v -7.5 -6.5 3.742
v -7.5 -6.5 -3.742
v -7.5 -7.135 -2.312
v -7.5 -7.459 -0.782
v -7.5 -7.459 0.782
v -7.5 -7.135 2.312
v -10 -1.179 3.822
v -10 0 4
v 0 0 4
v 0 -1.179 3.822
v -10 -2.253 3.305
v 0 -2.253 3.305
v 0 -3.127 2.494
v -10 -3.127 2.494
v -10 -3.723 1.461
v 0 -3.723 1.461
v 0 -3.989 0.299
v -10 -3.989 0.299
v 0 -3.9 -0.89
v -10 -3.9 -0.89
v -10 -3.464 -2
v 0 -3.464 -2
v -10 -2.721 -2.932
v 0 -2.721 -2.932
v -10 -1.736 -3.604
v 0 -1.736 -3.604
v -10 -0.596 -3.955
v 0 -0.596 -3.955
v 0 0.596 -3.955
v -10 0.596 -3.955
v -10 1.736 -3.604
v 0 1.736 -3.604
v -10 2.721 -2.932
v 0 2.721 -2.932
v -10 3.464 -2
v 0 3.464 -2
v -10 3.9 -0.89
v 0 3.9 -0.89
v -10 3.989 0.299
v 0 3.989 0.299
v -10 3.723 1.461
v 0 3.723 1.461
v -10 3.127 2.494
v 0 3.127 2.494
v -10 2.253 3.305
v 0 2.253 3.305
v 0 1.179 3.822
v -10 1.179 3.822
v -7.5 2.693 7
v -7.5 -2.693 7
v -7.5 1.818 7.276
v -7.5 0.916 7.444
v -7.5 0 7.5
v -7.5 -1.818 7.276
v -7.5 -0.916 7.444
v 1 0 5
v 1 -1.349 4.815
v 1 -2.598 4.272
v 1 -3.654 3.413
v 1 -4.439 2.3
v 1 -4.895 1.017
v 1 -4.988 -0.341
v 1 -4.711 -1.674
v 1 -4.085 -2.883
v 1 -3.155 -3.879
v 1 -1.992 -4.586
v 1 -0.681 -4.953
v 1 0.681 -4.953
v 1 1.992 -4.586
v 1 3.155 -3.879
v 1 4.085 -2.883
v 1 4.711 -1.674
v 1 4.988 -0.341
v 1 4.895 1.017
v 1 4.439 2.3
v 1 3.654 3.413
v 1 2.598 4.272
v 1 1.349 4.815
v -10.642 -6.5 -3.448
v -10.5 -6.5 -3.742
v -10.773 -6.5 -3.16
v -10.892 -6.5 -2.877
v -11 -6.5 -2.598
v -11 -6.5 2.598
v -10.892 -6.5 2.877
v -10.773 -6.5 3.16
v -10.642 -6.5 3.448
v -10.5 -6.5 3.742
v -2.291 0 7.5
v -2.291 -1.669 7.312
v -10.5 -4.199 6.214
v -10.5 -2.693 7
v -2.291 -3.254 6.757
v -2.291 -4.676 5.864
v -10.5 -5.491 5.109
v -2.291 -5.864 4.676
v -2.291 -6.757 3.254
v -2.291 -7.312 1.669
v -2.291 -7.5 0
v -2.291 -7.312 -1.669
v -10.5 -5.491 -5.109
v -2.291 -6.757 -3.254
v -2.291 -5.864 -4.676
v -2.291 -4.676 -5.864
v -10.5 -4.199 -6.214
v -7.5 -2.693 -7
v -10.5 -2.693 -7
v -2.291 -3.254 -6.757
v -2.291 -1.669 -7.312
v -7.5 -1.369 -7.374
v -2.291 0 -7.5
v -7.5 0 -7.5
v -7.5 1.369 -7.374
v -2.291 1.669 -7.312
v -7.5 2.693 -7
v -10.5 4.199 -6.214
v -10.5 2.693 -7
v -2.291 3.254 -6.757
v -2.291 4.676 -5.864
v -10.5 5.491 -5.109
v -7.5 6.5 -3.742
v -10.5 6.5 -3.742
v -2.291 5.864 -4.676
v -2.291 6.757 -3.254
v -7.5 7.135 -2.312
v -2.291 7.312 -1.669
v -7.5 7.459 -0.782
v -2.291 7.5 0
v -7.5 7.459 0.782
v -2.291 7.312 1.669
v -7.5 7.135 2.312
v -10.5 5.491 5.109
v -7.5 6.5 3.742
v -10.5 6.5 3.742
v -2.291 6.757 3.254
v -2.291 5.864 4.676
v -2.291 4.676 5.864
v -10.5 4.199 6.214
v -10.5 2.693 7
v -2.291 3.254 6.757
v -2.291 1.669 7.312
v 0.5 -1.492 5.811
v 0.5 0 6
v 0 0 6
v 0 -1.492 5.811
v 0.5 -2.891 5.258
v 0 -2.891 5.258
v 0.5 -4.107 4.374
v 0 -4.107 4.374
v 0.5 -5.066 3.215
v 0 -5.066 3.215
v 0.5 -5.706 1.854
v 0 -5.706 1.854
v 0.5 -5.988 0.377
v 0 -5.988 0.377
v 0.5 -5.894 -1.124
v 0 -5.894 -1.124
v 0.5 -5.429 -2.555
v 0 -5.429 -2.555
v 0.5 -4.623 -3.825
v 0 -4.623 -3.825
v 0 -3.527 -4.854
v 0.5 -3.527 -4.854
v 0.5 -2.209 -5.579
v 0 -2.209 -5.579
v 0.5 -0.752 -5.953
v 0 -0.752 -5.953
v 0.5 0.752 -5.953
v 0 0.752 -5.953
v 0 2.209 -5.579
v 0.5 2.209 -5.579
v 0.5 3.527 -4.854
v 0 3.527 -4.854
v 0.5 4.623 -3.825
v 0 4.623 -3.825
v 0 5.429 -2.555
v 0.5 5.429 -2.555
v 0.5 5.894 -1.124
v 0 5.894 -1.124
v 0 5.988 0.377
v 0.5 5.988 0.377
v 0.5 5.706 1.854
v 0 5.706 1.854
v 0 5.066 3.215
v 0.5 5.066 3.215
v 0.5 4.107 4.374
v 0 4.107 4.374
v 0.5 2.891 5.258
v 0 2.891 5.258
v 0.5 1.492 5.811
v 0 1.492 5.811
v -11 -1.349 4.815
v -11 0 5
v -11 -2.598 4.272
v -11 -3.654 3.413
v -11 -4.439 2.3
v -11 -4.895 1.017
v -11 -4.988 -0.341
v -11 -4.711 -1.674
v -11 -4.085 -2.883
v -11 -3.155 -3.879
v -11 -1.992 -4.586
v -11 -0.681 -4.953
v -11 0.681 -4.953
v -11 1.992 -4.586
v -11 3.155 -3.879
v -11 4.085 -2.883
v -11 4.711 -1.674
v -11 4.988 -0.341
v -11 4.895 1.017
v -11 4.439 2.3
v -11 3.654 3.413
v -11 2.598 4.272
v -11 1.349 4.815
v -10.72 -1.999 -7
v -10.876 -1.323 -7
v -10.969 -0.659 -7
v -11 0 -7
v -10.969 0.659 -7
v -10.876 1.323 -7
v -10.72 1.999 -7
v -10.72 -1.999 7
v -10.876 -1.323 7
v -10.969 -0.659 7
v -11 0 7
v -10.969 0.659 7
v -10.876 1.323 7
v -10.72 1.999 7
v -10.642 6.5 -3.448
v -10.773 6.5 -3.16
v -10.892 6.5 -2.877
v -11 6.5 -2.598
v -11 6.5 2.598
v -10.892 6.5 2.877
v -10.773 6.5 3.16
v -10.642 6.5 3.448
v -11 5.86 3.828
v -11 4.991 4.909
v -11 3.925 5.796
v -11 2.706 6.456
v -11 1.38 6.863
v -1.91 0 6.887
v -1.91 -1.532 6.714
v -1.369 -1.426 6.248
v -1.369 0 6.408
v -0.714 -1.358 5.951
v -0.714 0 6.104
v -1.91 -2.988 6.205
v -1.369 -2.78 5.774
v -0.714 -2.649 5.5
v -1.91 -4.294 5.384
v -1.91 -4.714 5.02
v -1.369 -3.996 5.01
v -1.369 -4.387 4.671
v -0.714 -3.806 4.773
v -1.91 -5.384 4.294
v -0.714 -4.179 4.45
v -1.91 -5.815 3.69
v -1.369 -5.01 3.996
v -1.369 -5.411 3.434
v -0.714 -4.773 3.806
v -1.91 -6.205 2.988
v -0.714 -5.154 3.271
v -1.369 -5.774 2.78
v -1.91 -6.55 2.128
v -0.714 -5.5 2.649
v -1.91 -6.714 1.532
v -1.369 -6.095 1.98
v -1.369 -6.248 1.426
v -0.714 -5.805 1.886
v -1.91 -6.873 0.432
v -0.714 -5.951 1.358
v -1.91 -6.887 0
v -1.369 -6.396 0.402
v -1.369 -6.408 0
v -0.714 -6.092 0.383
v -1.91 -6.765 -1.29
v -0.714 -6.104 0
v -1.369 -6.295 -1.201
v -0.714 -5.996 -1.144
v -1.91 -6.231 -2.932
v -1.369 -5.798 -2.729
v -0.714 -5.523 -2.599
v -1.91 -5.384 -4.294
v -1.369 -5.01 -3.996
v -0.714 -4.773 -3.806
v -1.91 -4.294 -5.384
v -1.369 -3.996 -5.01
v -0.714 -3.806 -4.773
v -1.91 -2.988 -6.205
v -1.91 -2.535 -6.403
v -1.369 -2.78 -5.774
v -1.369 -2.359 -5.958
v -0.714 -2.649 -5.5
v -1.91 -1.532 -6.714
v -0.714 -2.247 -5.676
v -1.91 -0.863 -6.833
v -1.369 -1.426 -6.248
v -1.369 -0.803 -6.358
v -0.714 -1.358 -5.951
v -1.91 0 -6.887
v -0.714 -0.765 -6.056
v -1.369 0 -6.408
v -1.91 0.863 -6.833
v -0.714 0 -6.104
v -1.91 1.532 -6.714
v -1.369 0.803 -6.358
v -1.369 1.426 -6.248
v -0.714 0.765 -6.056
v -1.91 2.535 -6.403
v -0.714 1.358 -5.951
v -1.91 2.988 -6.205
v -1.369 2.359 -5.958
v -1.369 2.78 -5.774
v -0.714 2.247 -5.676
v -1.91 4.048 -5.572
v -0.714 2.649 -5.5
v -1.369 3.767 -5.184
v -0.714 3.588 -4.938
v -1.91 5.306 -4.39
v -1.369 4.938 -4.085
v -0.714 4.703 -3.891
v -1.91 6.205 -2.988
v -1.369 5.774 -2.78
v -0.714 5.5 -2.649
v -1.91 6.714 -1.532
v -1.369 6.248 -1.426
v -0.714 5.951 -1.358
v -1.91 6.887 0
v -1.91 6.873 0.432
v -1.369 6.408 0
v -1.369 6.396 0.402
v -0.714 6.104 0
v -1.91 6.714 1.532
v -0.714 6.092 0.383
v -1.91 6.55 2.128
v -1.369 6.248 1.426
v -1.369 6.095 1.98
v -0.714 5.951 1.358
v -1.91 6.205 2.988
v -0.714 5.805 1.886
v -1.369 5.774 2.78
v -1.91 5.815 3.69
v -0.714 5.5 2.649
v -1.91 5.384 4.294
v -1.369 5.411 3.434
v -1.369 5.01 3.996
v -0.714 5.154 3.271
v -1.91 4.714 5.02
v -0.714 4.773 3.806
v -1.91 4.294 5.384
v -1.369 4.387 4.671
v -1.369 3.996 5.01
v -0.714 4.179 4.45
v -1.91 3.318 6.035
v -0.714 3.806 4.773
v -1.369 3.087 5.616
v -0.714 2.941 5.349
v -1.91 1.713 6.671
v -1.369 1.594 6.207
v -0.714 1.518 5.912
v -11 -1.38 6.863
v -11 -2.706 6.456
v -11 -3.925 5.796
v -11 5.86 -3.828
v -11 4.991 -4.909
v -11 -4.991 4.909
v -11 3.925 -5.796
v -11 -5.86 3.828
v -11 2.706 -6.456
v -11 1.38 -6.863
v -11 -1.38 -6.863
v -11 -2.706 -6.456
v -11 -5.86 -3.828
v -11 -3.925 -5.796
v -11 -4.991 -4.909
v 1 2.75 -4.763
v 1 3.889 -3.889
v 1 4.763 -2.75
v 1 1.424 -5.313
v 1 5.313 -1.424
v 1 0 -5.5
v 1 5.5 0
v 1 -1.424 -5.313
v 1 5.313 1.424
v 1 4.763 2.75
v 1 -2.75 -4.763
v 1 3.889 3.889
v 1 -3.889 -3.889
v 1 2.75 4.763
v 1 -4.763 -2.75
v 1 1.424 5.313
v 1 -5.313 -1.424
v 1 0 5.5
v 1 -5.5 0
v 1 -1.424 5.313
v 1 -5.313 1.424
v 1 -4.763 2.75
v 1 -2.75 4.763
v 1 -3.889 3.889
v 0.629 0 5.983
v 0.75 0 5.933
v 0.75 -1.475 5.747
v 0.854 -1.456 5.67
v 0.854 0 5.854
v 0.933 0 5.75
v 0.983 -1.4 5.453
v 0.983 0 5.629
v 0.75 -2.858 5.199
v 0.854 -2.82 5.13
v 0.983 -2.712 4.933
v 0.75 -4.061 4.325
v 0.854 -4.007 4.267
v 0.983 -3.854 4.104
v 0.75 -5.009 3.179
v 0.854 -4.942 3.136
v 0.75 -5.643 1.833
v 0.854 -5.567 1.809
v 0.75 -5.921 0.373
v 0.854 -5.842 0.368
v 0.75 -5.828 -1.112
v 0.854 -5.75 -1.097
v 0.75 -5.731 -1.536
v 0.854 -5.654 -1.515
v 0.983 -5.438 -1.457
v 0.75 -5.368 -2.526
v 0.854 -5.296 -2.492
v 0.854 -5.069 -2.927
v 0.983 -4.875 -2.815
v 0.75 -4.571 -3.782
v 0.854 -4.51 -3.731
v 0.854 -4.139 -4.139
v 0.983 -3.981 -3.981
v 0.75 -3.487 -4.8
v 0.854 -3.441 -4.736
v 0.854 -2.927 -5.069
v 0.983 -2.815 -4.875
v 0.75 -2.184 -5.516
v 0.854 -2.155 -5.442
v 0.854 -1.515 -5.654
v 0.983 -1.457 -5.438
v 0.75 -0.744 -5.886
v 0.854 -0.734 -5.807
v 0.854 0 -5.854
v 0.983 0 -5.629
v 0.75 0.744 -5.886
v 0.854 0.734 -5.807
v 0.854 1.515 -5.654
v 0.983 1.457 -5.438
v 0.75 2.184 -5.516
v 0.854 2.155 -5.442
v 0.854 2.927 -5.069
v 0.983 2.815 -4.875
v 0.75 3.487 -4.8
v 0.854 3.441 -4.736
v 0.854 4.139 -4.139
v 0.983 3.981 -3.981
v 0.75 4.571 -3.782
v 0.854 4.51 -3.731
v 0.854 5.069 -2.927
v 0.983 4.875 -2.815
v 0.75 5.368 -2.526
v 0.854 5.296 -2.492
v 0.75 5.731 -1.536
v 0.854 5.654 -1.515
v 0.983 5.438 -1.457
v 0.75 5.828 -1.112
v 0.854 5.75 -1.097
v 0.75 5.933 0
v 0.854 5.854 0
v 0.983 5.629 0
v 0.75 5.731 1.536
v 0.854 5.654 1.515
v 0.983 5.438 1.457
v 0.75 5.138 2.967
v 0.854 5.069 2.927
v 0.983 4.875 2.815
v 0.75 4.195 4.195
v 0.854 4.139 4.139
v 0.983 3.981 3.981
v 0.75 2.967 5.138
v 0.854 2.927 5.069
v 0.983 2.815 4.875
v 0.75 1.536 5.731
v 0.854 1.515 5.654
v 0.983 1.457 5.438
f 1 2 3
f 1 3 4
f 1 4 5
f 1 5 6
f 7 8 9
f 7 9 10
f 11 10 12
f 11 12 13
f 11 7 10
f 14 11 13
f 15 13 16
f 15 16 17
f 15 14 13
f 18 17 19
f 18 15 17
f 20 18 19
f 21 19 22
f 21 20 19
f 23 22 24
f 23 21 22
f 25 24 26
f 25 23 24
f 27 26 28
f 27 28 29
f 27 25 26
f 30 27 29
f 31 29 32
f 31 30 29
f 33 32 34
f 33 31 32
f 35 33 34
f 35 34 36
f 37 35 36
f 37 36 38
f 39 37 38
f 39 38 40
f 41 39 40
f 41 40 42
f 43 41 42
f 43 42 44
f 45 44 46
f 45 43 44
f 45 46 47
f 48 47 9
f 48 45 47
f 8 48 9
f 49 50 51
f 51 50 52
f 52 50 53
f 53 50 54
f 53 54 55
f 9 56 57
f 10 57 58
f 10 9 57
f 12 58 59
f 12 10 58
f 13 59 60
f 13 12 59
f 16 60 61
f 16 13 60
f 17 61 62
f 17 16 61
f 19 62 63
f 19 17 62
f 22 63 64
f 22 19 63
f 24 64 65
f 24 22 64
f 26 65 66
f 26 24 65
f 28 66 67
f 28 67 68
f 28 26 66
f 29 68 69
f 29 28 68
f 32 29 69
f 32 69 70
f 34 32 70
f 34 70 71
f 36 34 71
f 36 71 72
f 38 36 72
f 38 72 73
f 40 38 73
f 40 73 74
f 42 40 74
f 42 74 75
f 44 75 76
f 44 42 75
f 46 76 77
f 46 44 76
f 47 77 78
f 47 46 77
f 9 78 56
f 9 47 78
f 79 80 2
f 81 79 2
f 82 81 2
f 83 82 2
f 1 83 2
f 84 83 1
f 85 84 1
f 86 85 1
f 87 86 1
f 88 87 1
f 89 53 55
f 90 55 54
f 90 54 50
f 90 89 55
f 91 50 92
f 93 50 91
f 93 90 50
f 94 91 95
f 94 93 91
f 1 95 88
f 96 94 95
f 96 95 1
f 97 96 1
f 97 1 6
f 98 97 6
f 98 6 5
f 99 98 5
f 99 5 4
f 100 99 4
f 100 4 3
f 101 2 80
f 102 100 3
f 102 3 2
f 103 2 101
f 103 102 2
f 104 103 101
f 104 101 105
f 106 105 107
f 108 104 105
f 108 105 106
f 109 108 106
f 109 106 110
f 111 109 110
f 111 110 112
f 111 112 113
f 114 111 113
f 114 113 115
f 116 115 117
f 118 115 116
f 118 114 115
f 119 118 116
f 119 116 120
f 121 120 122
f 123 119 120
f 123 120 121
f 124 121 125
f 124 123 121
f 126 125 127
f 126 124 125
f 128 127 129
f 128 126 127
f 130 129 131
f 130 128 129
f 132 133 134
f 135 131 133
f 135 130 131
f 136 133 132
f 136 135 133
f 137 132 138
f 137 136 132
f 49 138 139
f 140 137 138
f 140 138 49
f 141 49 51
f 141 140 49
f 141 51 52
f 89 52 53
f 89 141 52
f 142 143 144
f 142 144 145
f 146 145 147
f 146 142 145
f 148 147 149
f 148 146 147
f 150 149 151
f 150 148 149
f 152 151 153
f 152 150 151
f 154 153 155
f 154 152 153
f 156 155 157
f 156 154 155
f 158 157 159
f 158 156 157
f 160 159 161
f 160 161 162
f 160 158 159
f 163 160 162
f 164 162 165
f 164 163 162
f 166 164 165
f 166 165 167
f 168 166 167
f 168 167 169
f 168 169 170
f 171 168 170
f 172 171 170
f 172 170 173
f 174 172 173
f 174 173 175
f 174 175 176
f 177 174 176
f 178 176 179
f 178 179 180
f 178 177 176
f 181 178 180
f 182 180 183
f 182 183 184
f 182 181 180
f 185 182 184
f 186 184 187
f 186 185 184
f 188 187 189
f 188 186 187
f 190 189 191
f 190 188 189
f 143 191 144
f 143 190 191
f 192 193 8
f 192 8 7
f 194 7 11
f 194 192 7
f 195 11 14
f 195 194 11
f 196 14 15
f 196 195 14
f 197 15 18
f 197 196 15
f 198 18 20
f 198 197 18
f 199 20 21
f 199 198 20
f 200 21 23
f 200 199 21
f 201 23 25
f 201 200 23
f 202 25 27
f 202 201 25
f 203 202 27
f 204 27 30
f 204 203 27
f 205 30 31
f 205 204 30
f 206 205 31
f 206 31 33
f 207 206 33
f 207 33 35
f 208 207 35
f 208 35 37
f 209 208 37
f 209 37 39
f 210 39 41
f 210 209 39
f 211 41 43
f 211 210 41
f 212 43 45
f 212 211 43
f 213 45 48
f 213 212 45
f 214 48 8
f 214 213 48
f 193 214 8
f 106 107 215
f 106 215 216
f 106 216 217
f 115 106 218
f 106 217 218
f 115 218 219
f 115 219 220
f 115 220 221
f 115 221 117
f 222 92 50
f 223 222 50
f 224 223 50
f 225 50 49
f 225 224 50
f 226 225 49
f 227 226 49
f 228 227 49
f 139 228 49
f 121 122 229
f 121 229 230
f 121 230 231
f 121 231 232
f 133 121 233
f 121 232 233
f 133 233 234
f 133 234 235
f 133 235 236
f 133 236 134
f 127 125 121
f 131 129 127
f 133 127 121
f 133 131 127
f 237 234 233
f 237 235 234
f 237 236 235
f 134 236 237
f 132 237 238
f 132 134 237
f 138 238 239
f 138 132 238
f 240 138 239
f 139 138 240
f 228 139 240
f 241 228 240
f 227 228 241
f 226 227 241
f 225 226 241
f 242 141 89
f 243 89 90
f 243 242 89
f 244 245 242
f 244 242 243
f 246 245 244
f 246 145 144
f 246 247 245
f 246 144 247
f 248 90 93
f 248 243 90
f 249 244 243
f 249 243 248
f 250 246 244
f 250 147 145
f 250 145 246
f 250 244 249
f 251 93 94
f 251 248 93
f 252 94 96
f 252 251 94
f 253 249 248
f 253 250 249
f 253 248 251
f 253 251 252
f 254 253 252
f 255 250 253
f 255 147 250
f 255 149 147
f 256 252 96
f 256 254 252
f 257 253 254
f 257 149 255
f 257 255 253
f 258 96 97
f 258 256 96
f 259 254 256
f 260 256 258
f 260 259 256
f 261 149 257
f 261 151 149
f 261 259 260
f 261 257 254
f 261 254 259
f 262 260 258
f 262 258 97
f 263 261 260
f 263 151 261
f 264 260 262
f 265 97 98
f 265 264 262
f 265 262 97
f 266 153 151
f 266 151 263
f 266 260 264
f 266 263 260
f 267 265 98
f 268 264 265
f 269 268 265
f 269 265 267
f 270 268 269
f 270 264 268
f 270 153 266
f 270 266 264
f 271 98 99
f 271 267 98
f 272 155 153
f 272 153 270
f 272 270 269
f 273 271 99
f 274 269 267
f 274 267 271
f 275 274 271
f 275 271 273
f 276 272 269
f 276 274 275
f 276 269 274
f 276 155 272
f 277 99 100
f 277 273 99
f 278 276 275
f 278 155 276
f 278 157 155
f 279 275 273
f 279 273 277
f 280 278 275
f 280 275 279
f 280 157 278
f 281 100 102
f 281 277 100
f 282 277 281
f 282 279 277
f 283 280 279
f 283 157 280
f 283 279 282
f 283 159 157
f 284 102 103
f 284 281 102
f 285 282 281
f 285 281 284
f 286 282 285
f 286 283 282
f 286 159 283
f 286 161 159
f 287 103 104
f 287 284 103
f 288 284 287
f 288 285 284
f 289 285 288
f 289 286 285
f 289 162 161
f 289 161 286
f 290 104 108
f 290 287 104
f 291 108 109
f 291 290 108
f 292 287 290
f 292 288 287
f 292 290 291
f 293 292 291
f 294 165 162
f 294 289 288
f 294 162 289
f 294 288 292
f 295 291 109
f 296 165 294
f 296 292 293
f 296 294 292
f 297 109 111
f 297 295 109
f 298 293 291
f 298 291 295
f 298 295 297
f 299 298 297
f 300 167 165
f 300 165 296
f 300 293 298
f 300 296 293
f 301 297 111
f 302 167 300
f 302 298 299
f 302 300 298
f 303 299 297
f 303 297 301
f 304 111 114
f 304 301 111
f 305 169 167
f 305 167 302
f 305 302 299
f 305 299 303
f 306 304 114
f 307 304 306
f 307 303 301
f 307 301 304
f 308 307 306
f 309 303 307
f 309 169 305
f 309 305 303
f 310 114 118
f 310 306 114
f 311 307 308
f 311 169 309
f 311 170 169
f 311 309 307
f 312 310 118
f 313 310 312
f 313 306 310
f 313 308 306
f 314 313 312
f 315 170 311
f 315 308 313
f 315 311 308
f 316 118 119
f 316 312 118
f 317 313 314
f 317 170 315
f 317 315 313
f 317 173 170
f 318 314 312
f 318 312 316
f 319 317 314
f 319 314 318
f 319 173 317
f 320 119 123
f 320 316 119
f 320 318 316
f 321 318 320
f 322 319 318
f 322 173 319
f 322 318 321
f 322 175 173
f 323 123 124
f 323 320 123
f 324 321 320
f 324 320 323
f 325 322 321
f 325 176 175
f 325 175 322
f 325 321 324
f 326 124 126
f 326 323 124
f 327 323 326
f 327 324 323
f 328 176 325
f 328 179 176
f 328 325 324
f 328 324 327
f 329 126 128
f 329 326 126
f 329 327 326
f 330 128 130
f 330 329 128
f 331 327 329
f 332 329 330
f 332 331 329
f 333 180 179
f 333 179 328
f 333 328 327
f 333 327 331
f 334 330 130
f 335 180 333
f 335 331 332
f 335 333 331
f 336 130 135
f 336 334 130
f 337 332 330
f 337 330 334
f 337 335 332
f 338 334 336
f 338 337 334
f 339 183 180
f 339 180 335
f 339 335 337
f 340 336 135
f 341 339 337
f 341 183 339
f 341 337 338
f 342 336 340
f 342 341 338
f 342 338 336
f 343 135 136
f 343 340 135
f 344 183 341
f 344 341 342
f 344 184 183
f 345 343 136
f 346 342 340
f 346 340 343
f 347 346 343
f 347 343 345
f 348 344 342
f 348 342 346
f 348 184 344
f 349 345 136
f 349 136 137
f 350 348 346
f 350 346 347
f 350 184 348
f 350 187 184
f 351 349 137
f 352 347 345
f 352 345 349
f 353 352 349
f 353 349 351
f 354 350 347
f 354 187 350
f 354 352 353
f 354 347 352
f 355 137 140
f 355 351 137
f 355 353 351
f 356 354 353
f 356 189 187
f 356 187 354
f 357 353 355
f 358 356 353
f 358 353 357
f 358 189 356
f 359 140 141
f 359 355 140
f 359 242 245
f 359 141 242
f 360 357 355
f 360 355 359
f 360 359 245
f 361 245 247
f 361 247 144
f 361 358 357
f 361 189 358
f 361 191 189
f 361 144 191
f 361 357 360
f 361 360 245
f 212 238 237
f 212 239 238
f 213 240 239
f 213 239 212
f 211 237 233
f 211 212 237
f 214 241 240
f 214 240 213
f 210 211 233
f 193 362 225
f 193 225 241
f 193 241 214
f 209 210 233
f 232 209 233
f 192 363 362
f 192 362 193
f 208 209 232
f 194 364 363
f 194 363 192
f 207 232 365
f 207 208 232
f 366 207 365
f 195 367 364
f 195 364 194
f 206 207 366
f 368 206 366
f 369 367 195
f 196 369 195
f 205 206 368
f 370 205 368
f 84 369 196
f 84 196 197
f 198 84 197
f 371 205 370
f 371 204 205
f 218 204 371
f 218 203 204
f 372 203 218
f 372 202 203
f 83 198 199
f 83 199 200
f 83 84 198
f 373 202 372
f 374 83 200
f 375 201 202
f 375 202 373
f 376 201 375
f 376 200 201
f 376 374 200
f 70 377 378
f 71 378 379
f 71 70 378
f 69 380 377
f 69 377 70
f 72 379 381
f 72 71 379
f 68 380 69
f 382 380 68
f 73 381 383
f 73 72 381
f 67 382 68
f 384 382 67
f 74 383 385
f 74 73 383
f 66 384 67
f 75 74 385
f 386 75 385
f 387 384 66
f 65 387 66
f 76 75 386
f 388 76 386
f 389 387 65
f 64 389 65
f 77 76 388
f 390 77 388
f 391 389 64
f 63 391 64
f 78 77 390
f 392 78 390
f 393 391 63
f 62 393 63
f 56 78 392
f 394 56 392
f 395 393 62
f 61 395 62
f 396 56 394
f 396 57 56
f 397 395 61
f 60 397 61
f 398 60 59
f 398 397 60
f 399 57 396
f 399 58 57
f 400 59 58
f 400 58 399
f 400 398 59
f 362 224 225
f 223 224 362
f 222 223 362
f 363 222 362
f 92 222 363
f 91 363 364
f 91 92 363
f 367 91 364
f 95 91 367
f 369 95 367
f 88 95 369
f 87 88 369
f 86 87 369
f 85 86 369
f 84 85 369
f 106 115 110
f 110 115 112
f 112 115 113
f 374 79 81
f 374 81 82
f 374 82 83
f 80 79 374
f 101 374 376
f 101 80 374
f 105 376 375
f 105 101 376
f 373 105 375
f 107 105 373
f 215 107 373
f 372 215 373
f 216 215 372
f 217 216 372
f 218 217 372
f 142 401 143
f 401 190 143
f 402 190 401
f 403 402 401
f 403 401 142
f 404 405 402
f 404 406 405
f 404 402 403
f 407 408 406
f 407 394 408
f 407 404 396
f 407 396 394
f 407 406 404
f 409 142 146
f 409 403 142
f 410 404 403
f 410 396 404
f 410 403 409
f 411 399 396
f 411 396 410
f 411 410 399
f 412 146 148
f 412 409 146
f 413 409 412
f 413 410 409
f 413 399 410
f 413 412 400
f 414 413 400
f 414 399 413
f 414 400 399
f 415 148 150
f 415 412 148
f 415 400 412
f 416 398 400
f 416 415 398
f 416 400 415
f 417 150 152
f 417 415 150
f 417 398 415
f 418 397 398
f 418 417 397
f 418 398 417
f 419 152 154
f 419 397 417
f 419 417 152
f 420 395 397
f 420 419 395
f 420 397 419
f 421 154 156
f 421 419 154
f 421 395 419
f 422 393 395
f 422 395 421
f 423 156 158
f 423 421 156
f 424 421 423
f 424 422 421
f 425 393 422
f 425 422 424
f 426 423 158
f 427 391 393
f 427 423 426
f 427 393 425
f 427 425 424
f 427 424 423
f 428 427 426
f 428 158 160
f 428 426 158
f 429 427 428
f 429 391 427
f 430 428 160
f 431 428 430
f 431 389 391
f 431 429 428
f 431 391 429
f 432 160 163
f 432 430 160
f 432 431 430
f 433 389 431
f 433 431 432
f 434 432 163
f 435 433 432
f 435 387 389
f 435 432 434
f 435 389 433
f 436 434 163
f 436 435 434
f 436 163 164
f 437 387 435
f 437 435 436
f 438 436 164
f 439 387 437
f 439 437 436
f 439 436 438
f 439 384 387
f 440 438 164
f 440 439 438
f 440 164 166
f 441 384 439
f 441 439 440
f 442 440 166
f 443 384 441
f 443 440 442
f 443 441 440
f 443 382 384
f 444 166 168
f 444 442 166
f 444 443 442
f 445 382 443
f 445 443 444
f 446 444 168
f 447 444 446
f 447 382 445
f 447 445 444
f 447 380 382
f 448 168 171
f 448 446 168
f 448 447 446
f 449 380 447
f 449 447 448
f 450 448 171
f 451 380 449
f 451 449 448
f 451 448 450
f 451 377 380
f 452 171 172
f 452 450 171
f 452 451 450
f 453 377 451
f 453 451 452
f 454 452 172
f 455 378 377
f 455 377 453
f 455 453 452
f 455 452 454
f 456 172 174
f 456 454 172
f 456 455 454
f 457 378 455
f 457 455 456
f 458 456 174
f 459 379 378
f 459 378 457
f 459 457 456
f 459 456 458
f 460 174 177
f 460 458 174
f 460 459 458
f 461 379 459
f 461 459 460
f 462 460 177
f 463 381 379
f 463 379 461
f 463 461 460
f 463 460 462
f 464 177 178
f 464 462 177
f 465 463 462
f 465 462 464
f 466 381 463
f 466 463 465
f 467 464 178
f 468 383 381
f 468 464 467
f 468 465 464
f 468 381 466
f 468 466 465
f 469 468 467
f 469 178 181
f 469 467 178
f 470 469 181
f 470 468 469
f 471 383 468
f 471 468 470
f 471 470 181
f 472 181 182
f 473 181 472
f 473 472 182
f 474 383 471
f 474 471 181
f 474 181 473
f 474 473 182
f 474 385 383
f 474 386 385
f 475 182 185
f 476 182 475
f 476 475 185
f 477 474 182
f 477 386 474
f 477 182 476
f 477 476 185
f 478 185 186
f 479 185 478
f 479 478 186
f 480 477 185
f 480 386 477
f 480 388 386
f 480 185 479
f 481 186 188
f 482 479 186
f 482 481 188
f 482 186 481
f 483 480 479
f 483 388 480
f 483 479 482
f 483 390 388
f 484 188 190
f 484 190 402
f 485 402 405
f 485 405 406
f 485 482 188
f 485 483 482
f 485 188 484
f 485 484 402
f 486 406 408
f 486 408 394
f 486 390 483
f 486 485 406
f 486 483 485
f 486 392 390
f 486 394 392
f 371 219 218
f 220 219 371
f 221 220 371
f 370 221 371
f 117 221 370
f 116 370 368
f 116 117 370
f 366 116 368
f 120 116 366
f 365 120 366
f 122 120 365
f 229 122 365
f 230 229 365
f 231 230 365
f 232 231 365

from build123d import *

# Parameters (mm, degrees)
CONG_1_R                = 0.5
CHANFREIN1_SIZE         = 1
CHANFREIN2_SIZE         = 0.5
ESQUISSE2_OUTSIDE_W     = 21.874
ESQUISSE2_OUTSIDE_H     = 21.874
ESQUISSE2_OUTSIDE_W_2   = 14
ESQUISSE2_OUTSIDE_H_2   = 13
ENL_V_MAT_EXTRU_1_DEPTH = 3.5


with BuildPart() as part:
    # Esquisse1 → Révolution1 (revolve)
    with BuildSketch(Plane.XY, mode=Mode.PRIVATE) as r_volution1_sk:
        with BuildLine():
            Line((0, 6), (1, 6))
            Line((1, 6), (1, 4))
            Line((1, 4), (-11, 4))
            Line((-11, 4), (-11, 7.5))
            Line((-11, 7.5), (-2.291287847, 7.5))
            ThreePointArc((-2.291287847, 7.5), (-1.369306394, 6.408349934), (0, 6))
        make_face()
    revolve(r_volution1_sk.sketch.rotate(Axis((-14.539906675, 0, 0), (1, 0, 0)), 90), axis=Axis((-14.539906675, 0, 0), (1, 0, 0)))  # turned: the seam where the file's is

    # Congé1
    cong_1_edges = [part.edges().sort_by_distance(p)[0] for p in [
        (1, 0, -6),
    ]]
    fillet(cong_1_edges, radius=CONG_1_R)

    # Chanfrein1
    chanfrein1_edges = [part.edges().sort_by_distance(p)[0] for p in [
        (1, 0, -4),
        (-11, 0, -4),
    ]]
    chamfer(chanfrein1_edges, length=CHANFREIN1_SIZE)

    # Chanfrein2
    chanfrein2_edges = [part.edges().sort_by_distance(p)[0] for p in [
        (-11, 0, -7.5),
    ]]
    chamfer(chanfrein2_edges, length=CHANFREIN2_SIZE)

    # Esquisse2 outside → Enlèv. mat.-Extru.1 (cut)
    with BuildSketch(Plane.ZY.offset(11)):
        Rectangle(ESQUISSE2_OUTSIDE_W, ESQUISSE2_OUTSIDE_H)
        Rectangle(ESQUISSE2_OUTSIDE_W_2, ESQUISSE2_OUTSIDE_H_2, mode=Mode.SUBTRACT)
    extrude(amount=-ENL_V_MAT_EXTRU_1_DEPTH, mode=Mode.SUBTRACT)


solid = part.part
